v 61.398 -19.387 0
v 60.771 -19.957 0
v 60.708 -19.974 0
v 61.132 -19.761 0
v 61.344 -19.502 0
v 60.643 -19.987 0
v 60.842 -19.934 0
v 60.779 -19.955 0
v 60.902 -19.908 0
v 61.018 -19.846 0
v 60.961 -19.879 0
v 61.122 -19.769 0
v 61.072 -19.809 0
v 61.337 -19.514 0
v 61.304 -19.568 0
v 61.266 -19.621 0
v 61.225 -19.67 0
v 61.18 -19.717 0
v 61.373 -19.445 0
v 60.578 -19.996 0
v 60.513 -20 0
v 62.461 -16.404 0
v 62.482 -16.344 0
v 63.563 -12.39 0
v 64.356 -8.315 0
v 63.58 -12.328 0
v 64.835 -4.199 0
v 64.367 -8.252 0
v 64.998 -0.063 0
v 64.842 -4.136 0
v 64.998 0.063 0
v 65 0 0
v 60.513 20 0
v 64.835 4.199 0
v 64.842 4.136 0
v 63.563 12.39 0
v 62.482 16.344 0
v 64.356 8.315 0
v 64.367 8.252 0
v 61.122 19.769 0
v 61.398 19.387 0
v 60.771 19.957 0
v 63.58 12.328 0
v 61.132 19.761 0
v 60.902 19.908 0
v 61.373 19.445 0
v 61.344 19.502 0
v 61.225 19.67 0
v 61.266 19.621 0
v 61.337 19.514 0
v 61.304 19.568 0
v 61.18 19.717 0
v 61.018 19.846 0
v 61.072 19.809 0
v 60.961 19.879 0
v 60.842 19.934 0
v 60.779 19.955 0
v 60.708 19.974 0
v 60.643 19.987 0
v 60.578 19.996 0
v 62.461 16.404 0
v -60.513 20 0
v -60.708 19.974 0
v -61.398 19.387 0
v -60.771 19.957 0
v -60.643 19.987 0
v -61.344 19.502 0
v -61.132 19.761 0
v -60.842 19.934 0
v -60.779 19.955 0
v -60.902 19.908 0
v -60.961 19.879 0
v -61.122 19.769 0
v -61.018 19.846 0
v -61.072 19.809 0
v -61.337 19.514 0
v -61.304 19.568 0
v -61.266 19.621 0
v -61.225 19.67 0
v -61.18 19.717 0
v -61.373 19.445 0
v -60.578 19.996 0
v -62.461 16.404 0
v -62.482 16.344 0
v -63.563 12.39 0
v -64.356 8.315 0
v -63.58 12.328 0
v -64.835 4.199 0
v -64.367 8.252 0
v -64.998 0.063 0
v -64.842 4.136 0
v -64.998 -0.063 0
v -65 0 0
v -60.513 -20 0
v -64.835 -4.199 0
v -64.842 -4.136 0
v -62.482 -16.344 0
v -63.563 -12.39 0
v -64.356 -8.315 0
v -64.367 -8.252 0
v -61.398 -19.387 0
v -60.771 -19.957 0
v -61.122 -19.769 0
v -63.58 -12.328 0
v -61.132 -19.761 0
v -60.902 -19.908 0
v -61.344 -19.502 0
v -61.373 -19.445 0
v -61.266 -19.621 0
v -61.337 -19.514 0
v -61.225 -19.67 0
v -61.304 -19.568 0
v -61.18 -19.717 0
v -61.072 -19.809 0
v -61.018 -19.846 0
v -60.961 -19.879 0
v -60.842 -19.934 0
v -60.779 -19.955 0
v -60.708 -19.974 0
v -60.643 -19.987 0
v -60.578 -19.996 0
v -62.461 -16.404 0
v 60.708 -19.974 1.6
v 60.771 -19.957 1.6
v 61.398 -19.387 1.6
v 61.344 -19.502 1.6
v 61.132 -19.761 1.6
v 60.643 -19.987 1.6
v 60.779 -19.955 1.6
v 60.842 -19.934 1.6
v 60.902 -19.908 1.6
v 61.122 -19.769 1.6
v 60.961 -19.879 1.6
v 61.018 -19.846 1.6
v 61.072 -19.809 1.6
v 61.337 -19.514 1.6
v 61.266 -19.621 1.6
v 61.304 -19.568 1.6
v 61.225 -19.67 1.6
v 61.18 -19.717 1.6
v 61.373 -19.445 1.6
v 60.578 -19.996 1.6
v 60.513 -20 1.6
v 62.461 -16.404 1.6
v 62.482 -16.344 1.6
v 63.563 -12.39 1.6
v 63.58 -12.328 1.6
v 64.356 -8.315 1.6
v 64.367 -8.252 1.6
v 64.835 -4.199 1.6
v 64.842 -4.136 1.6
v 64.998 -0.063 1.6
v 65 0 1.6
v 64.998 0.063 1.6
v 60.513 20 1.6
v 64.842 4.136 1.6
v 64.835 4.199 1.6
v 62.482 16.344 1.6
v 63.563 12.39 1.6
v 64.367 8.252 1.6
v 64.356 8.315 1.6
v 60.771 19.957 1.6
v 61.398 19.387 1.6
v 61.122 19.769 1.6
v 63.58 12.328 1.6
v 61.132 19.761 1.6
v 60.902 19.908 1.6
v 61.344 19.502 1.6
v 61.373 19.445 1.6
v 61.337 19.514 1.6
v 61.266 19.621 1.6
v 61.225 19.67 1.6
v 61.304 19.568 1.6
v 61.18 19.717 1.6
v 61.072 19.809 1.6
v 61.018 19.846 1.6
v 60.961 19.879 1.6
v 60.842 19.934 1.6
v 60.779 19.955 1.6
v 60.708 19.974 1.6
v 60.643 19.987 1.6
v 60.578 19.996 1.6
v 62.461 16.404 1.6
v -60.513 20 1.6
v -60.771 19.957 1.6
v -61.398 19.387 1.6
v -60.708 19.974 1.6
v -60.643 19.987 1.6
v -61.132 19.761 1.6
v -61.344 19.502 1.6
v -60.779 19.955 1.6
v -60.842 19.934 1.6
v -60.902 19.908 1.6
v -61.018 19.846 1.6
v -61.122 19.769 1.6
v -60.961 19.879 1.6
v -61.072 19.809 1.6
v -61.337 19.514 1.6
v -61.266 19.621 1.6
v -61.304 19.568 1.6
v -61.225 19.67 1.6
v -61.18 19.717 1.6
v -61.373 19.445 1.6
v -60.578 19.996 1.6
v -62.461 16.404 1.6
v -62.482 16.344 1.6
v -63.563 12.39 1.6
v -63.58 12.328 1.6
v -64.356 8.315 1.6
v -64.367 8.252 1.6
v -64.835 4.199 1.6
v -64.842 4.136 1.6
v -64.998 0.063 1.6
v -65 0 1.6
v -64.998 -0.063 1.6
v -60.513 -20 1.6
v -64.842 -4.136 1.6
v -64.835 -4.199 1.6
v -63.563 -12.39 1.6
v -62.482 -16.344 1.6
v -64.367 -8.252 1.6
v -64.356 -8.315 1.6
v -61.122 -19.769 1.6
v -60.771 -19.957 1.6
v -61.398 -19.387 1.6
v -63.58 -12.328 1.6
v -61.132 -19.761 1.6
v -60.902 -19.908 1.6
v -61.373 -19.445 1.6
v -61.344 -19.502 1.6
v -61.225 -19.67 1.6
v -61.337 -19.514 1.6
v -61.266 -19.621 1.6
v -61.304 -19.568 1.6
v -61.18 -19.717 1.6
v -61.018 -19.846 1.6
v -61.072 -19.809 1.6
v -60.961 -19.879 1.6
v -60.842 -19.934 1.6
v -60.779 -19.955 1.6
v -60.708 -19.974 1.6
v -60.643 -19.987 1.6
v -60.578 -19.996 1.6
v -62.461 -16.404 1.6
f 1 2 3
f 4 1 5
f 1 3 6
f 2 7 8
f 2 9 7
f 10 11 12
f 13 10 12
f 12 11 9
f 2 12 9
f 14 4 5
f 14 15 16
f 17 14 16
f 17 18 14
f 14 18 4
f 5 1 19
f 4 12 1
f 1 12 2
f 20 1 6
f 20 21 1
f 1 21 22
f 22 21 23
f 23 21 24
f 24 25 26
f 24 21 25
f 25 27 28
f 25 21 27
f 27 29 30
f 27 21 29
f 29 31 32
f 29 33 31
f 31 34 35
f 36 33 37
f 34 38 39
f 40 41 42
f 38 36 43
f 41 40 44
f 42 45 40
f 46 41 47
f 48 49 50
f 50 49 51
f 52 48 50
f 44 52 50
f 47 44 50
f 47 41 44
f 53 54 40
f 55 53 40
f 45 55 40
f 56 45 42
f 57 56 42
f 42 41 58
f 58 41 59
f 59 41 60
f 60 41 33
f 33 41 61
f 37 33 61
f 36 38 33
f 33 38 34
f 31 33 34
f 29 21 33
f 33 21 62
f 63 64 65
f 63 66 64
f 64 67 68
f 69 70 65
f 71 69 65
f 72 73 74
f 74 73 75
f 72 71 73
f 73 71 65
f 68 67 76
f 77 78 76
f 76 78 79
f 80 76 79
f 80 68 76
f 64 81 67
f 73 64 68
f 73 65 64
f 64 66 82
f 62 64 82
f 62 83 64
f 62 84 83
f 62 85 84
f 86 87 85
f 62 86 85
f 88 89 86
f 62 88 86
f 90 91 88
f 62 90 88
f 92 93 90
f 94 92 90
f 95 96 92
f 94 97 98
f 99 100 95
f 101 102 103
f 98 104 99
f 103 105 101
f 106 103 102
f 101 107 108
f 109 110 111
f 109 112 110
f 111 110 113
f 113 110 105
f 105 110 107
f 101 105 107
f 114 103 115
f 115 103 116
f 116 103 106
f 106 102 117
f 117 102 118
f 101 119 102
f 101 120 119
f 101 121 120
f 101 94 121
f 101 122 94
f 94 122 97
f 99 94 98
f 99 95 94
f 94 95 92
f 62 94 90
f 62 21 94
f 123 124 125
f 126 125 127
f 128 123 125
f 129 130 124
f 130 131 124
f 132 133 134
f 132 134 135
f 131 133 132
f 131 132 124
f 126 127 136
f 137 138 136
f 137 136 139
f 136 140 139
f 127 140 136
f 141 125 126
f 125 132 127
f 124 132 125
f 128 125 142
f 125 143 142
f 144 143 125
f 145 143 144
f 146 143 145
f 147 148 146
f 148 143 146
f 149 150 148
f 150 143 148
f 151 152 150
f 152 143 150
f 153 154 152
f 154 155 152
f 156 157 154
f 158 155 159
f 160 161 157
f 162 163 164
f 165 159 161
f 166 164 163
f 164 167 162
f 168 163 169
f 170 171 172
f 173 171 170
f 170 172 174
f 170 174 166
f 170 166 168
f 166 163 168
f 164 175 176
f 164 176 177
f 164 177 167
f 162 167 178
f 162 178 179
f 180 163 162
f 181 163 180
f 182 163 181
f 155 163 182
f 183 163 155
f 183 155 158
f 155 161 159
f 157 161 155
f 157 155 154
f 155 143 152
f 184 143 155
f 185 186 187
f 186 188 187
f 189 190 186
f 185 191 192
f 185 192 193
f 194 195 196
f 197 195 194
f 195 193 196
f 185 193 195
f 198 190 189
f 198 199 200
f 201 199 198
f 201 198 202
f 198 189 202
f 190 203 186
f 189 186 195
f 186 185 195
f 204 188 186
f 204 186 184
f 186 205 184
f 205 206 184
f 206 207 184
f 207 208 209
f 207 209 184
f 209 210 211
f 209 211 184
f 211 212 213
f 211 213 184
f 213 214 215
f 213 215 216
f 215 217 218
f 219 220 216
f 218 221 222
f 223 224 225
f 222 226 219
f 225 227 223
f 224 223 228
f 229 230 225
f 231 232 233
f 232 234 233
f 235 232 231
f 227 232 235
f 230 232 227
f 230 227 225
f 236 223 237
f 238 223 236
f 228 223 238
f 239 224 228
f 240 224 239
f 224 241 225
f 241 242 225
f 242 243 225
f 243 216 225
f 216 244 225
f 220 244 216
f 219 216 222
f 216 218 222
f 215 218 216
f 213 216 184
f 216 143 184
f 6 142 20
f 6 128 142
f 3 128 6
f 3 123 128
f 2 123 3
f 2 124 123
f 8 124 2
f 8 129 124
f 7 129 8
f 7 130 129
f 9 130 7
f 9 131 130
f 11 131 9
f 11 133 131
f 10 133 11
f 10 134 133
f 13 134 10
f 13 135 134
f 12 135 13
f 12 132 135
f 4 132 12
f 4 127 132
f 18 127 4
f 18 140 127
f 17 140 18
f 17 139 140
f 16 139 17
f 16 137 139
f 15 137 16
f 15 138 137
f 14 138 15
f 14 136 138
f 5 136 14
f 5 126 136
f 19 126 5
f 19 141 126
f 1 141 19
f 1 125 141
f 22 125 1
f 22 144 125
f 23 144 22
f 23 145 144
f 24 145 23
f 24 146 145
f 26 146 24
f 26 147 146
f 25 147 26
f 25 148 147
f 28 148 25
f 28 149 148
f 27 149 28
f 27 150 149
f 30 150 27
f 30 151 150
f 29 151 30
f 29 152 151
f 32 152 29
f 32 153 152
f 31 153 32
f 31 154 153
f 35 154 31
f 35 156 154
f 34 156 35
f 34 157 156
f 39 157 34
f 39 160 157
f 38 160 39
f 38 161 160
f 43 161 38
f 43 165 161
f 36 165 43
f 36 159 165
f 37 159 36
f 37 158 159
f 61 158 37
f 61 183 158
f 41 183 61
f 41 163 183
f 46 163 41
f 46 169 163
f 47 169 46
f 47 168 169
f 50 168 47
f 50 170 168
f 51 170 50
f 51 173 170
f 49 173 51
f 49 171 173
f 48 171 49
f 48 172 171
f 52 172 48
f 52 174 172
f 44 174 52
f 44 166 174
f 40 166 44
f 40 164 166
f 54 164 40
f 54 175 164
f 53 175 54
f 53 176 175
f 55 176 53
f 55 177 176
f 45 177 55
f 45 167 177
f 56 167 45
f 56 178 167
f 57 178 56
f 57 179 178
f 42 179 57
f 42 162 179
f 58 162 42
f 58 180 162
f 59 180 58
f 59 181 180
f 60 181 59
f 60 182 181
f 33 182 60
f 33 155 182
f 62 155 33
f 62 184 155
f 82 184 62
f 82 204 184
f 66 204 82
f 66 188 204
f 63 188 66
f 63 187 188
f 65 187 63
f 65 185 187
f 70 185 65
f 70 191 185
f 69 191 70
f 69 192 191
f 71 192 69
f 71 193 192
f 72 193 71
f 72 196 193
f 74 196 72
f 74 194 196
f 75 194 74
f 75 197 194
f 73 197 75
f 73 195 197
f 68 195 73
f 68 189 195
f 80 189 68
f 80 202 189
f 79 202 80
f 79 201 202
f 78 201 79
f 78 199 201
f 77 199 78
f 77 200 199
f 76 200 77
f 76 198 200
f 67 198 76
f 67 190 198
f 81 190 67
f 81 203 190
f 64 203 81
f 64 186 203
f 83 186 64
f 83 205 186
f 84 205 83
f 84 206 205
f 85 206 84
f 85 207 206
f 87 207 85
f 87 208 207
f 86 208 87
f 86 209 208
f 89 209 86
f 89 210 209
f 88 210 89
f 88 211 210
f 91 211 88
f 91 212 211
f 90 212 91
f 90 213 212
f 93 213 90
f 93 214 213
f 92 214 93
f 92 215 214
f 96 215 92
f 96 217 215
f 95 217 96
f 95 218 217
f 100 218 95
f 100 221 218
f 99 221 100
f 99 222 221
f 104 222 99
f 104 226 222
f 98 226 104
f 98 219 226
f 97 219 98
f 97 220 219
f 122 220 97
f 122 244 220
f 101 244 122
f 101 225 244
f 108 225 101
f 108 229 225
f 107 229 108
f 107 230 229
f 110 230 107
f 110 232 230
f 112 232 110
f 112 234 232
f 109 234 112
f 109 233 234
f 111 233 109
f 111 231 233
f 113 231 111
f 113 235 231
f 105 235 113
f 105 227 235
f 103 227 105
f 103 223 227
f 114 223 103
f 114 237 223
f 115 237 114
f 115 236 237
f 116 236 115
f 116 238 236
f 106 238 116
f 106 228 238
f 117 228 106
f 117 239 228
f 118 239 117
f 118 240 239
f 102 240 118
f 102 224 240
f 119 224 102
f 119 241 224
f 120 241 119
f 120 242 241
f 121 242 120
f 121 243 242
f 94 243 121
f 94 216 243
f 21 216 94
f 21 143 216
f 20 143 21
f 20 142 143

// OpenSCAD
// file: case.scad
include <case_parameters.scad>
use <mainboard_outline.scad>

$fn = 90;
pcb_thickness = 1.6;

#difference(){
	case_base();
	resize([case_length-2*case_wallThickness, case_width-2*case_wallThickness, case_height-2*case_wallThickness]){
		case_base();
	}
	//debug
	translate([0, 0, case_height/2]){
		cube([case_length+1, case_width+1, case_height], center = true);
	}
	//debug
}

translate([0, 0, -case_height/2 + case_wallThickness + 1.5]){
	mainboard_outline();
}


module case_base(){
	radius = 1;
	minkowski(){
		resize([case_length-2*radius, case_width-2*radius, case_height-2*radius]){
			intersection(){
				cube([case_length, case_width, case_height], center=true);

				resize([2*case_length, case_width, 3*case_height])
					translate([0, 0, 0])
						rotate([0, 90, 0])
							cylinder(center=true);
				
				resize([case_length, 3*case_width, 3*case_height])
					translate([0, 0, 0])
						cylinder(center=true);
			}
		}
		sphere(r=radius);
	}
}
// file: case_parameters.scad
case_width = 45;
case_length = 3*case_width;
case_height = 17;

case_wallThickness = 1;
// main file
include <case_parameters.scad>
use <case.scad>

pcb_thickness = 1.6;

mainboard_outline();

module mainboard_outline(){
	color("Olive"){
		linear_extrude(pcb_thickness){
			projection(){
				delta = 2*case_wallThickness+3;
				resize([case_length-delta, case_width-delta, 0]){
					difference(){
						translate([0, 0, case_height/2])
							case_base();
						bottomCutHeight = case_wallThickness + 1.5;
						translate([0, 0, -case_height/2+bottomCutHeight])
							cube([case_length, case_width, case_height], center=true);
						translate([0, 0, case_height/2+bottomCutHeight+pcb_thickness])
							cube([case_length, case_width, case_height], center=true);
					}
				}
			}
		}
	}
}
